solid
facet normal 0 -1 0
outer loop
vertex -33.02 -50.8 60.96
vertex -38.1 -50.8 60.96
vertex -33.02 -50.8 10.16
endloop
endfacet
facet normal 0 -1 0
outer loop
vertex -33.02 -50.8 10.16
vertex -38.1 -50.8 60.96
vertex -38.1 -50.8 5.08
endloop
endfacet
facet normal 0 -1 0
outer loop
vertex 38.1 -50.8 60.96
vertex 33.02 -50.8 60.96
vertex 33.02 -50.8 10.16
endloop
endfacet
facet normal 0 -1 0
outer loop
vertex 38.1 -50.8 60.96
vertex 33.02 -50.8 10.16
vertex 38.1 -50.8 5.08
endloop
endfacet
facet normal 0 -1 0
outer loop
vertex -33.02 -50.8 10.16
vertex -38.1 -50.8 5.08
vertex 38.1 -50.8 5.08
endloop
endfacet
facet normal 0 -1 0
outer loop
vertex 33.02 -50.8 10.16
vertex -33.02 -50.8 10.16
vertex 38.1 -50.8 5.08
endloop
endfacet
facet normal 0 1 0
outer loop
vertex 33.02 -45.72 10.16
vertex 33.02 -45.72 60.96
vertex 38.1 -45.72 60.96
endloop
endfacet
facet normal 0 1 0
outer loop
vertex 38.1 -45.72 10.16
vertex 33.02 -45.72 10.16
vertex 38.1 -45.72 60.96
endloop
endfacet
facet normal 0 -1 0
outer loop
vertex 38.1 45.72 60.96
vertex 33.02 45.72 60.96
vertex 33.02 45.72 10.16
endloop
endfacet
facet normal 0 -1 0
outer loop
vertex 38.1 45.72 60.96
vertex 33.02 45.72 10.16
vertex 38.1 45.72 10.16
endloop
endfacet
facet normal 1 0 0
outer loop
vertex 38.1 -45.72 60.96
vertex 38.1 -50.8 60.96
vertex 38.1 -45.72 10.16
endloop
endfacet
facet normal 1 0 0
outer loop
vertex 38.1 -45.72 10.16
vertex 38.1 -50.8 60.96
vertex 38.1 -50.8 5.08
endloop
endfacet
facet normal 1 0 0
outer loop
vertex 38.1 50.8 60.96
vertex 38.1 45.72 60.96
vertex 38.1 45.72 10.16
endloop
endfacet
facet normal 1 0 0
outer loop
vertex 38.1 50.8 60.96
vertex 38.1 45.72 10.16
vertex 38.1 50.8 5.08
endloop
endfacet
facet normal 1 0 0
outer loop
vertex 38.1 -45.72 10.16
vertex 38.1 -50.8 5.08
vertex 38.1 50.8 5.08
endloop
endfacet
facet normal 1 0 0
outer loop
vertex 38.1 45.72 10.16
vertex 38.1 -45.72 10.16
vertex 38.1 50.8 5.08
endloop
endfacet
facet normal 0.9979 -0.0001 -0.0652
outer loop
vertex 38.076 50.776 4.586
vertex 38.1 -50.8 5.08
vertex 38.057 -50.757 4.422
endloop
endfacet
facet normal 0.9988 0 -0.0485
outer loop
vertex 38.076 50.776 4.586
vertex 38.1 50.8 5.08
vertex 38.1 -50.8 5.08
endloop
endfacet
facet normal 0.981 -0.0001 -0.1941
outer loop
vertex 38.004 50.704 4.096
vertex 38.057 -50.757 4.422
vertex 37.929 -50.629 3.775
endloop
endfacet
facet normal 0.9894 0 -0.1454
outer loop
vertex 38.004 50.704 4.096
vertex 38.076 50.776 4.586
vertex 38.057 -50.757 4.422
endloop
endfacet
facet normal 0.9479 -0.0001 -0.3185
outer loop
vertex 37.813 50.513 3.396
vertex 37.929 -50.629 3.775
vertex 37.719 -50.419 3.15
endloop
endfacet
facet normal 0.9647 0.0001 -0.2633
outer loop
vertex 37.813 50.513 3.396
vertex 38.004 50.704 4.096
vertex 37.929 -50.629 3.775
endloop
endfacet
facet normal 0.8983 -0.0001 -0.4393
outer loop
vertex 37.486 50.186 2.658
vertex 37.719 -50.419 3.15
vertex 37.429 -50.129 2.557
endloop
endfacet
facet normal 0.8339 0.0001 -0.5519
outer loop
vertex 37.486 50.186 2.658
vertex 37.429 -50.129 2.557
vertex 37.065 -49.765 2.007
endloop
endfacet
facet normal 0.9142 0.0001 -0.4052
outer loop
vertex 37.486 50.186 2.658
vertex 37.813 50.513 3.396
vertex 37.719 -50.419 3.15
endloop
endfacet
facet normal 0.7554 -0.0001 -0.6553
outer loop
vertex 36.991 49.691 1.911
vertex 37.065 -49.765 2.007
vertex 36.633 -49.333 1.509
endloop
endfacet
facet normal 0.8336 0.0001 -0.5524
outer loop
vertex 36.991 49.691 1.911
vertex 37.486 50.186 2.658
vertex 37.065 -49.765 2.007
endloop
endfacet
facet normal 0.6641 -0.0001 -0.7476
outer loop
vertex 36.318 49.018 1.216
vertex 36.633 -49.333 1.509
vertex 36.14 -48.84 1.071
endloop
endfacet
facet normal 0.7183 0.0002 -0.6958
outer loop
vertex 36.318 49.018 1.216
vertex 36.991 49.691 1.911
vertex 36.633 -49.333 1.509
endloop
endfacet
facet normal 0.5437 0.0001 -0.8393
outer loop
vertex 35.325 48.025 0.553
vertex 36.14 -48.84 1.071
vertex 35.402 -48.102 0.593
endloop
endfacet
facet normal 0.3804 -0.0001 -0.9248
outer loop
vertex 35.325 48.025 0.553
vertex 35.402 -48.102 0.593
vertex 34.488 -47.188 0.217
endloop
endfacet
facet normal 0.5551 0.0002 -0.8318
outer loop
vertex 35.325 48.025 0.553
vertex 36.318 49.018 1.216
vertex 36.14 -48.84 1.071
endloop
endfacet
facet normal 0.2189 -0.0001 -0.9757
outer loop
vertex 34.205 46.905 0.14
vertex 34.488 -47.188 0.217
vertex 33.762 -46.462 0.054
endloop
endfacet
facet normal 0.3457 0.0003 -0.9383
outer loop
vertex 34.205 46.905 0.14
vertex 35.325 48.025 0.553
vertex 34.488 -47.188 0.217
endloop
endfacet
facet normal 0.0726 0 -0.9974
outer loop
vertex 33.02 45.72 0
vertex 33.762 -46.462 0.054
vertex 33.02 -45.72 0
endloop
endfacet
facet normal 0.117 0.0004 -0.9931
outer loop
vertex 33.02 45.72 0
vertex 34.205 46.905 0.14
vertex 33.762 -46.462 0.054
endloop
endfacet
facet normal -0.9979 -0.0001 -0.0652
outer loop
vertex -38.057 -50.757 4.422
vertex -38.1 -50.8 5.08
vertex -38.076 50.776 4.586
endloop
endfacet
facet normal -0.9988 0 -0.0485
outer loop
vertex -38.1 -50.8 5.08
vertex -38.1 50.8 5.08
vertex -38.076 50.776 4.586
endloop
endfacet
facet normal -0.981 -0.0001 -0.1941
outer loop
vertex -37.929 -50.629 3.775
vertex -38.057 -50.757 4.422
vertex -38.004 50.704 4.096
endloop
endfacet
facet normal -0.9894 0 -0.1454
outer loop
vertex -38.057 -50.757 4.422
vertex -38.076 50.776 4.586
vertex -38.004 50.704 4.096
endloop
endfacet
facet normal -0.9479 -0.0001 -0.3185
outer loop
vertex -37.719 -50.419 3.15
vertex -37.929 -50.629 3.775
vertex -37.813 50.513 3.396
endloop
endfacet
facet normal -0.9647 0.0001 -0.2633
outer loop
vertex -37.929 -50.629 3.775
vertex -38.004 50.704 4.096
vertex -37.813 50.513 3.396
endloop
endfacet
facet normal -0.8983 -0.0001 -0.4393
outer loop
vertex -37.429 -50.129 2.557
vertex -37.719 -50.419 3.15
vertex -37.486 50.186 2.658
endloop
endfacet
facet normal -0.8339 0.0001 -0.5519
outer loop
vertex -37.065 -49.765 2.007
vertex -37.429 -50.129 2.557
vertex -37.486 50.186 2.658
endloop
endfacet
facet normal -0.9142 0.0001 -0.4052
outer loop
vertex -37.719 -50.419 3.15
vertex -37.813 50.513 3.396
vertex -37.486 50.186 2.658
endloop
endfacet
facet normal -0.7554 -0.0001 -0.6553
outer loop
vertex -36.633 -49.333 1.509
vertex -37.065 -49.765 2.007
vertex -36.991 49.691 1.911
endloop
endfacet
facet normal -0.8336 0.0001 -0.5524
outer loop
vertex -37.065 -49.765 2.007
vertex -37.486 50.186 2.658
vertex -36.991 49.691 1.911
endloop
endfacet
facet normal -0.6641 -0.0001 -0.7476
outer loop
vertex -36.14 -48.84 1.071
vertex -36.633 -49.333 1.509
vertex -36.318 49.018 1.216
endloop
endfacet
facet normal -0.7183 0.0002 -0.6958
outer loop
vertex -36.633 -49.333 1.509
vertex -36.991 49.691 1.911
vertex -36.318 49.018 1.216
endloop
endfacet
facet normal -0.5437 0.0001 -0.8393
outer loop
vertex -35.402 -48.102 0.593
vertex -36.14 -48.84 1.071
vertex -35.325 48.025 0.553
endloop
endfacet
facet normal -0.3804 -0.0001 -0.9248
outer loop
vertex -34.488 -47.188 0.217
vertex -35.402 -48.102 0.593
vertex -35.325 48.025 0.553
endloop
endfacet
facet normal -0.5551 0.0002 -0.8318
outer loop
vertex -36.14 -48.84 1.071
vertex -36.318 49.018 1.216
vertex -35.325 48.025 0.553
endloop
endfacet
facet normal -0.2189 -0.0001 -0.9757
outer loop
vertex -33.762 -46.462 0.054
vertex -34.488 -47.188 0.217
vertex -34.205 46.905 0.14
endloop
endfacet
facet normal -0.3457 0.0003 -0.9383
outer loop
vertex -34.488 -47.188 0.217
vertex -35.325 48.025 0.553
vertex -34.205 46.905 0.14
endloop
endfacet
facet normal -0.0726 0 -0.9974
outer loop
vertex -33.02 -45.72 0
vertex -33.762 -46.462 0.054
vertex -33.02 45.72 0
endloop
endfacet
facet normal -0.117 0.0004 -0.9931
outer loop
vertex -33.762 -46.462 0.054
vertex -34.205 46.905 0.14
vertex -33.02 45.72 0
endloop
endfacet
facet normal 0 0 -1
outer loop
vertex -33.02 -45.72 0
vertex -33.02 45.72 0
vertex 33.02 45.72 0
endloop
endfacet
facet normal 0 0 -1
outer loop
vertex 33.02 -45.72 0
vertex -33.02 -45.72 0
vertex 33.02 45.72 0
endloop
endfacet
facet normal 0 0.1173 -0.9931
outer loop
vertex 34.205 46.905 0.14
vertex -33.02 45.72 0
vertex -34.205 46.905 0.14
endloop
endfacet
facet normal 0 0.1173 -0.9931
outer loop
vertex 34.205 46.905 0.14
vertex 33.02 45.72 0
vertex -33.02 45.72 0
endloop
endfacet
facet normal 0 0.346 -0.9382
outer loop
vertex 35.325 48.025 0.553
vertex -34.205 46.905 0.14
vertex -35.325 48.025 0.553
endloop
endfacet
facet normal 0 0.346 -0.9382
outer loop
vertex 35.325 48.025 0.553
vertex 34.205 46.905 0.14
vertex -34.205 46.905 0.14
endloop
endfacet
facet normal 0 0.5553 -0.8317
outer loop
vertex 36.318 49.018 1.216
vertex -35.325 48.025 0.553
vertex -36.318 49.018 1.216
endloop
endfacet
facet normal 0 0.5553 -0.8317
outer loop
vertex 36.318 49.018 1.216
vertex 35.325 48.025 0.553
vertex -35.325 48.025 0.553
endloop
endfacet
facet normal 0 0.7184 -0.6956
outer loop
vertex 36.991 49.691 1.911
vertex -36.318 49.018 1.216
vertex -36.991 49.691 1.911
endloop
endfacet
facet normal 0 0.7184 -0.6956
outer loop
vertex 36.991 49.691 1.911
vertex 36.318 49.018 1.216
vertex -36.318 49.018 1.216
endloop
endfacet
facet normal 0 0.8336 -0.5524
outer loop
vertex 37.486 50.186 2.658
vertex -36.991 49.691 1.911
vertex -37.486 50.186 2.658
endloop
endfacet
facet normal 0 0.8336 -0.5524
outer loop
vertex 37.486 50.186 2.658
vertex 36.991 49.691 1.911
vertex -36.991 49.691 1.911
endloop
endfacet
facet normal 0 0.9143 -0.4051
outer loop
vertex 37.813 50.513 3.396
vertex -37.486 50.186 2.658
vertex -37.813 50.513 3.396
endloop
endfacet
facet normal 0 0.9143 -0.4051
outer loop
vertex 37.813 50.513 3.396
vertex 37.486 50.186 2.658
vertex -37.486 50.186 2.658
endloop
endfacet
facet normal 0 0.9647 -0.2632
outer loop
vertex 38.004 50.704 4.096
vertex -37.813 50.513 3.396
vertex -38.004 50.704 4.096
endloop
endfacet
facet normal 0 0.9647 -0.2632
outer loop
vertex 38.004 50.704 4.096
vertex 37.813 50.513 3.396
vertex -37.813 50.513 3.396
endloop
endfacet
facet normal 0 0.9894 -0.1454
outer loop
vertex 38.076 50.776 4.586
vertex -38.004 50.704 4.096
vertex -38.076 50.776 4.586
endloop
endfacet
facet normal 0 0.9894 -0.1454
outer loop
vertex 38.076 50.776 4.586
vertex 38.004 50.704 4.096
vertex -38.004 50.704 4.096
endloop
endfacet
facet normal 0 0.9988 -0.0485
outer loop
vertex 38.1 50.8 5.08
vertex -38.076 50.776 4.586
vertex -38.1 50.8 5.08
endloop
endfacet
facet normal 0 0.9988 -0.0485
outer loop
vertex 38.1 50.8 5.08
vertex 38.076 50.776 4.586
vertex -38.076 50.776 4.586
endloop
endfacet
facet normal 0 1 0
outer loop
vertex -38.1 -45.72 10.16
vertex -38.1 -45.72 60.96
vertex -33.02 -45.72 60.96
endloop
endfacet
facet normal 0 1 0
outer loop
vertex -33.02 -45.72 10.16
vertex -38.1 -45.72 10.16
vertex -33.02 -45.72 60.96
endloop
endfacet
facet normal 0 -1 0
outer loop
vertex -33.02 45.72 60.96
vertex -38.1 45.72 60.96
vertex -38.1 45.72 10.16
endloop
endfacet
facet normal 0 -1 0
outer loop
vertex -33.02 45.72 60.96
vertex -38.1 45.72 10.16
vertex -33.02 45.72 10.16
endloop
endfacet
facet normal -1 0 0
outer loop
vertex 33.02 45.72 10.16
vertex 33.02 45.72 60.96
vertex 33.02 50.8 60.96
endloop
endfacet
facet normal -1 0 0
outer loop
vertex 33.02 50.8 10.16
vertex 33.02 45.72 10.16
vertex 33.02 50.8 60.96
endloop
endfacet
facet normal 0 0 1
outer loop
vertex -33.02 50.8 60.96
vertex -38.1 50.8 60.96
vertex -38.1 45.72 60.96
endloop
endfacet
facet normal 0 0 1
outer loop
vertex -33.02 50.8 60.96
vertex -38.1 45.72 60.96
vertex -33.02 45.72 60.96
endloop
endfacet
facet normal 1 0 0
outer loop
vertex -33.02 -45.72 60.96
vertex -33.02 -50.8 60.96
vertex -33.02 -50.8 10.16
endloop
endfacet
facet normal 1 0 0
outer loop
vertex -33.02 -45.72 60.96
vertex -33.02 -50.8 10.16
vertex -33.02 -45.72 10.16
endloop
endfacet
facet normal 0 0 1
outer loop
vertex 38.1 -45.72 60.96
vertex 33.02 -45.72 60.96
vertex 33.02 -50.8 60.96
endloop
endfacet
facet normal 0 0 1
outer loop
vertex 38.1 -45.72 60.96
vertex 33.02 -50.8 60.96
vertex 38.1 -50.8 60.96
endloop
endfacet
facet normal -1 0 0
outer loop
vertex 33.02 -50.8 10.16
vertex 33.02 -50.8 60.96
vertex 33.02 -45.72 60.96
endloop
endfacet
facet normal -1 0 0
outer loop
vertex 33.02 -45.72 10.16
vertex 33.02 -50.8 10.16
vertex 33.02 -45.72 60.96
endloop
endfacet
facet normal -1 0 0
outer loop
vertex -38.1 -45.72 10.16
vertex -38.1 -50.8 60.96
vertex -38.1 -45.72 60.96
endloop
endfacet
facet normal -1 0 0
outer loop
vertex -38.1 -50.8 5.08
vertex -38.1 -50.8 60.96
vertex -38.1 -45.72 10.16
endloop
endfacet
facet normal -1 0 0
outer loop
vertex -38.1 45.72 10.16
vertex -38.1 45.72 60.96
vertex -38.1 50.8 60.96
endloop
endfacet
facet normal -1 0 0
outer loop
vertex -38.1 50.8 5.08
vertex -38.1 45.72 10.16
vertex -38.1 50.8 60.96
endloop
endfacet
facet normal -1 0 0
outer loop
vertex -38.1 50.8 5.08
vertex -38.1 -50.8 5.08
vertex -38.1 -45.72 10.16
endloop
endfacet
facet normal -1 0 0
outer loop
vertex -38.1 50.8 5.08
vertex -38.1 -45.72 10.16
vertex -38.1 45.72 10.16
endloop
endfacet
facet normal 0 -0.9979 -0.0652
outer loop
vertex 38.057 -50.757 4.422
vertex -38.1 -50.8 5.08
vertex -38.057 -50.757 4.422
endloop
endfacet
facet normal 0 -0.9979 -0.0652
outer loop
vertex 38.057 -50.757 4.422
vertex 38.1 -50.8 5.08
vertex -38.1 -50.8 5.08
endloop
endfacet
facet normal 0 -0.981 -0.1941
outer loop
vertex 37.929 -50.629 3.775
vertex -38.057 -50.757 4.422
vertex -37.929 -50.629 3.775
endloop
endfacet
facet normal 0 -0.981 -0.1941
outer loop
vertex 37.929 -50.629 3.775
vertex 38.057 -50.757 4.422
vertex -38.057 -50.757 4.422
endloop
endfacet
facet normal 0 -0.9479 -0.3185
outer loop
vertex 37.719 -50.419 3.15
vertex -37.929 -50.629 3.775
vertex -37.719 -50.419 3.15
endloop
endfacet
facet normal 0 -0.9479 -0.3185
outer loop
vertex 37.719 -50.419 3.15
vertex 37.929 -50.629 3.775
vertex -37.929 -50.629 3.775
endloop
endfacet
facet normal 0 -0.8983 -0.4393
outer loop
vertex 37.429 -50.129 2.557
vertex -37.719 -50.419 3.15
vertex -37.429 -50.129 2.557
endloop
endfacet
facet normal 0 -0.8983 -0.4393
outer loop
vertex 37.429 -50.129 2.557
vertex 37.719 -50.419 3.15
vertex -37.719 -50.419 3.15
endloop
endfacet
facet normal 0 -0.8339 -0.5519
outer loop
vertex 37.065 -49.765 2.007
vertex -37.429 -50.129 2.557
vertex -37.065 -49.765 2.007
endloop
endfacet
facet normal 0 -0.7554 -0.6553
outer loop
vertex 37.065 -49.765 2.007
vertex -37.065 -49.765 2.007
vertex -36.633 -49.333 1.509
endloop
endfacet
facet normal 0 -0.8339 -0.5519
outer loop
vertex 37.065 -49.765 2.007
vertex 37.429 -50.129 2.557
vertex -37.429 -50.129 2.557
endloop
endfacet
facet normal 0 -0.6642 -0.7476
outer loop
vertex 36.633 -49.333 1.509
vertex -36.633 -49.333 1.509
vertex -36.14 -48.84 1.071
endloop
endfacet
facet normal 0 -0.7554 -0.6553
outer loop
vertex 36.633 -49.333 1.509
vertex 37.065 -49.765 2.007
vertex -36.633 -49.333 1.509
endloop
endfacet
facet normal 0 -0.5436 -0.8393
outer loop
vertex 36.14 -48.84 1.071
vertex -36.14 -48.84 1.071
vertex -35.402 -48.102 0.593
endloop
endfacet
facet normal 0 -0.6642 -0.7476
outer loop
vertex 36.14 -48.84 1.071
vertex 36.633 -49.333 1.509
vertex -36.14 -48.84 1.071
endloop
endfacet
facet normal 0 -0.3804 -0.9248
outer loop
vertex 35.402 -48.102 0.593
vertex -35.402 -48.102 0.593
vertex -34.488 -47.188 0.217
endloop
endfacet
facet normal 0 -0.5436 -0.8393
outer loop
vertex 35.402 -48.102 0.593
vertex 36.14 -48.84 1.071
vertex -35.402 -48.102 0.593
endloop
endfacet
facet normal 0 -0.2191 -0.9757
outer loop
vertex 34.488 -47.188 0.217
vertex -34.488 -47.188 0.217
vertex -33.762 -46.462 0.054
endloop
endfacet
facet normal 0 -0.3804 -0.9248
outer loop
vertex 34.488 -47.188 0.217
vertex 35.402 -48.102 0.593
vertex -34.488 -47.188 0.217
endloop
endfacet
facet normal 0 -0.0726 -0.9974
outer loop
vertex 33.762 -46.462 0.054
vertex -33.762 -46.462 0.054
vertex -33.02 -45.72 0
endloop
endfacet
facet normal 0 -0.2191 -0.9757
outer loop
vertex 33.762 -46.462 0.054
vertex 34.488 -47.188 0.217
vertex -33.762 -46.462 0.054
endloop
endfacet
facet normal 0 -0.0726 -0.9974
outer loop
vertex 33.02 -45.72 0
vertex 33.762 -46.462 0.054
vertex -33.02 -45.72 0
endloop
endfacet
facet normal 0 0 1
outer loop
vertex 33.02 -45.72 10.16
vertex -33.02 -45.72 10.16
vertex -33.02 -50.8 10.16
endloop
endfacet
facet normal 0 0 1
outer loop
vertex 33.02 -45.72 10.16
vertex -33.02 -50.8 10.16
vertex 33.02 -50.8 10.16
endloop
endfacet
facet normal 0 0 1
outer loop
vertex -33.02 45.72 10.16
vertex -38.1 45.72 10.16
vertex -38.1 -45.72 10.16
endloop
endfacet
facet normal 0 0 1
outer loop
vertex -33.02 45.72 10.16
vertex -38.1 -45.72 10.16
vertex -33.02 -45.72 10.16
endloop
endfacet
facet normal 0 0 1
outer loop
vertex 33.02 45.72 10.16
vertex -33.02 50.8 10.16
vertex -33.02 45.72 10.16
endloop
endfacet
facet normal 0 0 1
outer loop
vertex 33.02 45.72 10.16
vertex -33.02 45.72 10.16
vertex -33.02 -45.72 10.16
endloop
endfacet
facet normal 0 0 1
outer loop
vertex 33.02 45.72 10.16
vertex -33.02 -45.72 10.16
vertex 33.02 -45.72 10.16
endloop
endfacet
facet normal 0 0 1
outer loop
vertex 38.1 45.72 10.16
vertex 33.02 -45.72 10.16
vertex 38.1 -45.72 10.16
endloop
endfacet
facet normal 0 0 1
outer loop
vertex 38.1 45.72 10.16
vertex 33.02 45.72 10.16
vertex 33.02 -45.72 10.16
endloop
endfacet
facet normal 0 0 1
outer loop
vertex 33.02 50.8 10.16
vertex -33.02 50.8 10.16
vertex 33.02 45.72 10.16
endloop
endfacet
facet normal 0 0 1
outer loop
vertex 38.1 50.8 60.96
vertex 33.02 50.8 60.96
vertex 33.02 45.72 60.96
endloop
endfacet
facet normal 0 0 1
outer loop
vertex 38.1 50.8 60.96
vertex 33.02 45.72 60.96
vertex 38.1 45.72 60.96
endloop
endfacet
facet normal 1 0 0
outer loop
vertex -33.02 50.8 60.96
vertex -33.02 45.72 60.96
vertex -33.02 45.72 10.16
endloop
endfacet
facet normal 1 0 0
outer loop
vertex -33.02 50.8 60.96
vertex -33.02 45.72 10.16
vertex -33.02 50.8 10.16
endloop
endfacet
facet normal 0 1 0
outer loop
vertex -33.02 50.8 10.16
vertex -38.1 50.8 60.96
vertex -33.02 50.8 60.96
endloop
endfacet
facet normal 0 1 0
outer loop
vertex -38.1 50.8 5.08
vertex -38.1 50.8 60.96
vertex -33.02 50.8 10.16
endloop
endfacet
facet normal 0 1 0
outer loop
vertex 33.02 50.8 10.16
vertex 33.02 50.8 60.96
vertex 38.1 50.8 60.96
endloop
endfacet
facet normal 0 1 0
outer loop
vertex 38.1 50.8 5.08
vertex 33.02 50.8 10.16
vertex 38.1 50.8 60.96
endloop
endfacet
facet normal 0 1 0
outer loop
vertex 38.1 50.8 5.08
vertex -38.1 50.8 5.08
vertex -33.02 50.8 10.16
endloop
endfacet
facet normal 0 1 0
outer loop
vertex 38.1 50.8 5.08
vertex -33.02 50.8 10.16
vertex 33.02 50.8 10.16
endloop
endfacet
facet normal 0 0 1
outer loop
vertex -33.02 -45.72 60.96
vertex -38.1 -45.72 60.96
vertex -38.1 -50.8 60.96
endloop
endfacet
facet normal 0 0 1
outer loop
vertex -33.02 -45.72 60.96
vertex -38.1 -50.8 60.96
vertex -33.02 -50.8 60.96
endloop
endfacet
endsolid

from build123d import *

# Parameters (mm, degrees)
F0_W     = 76.2
F0_H     = 101.6
F1_DEPTH = 10.16
F2_W     = 5.08
F2_H     = 5.08
F3_DEPTH = 50.8
F4_R     = 5.08


with BuildPart() as f1:
    # F0 (on Top) → F1 (new body)
    with BuildSketch(Plane.XY):
        Rectangle(F0_W, F0_H)
    extrude(amount=F1_DEPTH)

    # F2 (on face) → F3 (join)
    with BuildSketch(Plane.XY.offset(10.16)):
        with Locations((35.56, 48.26)):
            Rectangle(F2_W, F2_H)
        with Locations((35.56, -48.26)):
            Rectangle(F2_W, F2_H)
        with Locations((-35.56, 48.26)):
            Rectangle(F2_W, F2_H)
        with Locations((-35.56, -48.26)):
            Rectangle(F2_W, F2_H)
    extrude(amount=F3_DEPTH)

    # F4
    f4_edges = [f1.edges().sort_by_distance(p)[0] for p in [
        (0, 50.8, 0),
        (38.1, 0, 0),
        (0, -50.8, 0),
        (-38.1, 0, 0),
    ]]
    fillet(f4_edges, radius=F4_R)


solid = f1.part
